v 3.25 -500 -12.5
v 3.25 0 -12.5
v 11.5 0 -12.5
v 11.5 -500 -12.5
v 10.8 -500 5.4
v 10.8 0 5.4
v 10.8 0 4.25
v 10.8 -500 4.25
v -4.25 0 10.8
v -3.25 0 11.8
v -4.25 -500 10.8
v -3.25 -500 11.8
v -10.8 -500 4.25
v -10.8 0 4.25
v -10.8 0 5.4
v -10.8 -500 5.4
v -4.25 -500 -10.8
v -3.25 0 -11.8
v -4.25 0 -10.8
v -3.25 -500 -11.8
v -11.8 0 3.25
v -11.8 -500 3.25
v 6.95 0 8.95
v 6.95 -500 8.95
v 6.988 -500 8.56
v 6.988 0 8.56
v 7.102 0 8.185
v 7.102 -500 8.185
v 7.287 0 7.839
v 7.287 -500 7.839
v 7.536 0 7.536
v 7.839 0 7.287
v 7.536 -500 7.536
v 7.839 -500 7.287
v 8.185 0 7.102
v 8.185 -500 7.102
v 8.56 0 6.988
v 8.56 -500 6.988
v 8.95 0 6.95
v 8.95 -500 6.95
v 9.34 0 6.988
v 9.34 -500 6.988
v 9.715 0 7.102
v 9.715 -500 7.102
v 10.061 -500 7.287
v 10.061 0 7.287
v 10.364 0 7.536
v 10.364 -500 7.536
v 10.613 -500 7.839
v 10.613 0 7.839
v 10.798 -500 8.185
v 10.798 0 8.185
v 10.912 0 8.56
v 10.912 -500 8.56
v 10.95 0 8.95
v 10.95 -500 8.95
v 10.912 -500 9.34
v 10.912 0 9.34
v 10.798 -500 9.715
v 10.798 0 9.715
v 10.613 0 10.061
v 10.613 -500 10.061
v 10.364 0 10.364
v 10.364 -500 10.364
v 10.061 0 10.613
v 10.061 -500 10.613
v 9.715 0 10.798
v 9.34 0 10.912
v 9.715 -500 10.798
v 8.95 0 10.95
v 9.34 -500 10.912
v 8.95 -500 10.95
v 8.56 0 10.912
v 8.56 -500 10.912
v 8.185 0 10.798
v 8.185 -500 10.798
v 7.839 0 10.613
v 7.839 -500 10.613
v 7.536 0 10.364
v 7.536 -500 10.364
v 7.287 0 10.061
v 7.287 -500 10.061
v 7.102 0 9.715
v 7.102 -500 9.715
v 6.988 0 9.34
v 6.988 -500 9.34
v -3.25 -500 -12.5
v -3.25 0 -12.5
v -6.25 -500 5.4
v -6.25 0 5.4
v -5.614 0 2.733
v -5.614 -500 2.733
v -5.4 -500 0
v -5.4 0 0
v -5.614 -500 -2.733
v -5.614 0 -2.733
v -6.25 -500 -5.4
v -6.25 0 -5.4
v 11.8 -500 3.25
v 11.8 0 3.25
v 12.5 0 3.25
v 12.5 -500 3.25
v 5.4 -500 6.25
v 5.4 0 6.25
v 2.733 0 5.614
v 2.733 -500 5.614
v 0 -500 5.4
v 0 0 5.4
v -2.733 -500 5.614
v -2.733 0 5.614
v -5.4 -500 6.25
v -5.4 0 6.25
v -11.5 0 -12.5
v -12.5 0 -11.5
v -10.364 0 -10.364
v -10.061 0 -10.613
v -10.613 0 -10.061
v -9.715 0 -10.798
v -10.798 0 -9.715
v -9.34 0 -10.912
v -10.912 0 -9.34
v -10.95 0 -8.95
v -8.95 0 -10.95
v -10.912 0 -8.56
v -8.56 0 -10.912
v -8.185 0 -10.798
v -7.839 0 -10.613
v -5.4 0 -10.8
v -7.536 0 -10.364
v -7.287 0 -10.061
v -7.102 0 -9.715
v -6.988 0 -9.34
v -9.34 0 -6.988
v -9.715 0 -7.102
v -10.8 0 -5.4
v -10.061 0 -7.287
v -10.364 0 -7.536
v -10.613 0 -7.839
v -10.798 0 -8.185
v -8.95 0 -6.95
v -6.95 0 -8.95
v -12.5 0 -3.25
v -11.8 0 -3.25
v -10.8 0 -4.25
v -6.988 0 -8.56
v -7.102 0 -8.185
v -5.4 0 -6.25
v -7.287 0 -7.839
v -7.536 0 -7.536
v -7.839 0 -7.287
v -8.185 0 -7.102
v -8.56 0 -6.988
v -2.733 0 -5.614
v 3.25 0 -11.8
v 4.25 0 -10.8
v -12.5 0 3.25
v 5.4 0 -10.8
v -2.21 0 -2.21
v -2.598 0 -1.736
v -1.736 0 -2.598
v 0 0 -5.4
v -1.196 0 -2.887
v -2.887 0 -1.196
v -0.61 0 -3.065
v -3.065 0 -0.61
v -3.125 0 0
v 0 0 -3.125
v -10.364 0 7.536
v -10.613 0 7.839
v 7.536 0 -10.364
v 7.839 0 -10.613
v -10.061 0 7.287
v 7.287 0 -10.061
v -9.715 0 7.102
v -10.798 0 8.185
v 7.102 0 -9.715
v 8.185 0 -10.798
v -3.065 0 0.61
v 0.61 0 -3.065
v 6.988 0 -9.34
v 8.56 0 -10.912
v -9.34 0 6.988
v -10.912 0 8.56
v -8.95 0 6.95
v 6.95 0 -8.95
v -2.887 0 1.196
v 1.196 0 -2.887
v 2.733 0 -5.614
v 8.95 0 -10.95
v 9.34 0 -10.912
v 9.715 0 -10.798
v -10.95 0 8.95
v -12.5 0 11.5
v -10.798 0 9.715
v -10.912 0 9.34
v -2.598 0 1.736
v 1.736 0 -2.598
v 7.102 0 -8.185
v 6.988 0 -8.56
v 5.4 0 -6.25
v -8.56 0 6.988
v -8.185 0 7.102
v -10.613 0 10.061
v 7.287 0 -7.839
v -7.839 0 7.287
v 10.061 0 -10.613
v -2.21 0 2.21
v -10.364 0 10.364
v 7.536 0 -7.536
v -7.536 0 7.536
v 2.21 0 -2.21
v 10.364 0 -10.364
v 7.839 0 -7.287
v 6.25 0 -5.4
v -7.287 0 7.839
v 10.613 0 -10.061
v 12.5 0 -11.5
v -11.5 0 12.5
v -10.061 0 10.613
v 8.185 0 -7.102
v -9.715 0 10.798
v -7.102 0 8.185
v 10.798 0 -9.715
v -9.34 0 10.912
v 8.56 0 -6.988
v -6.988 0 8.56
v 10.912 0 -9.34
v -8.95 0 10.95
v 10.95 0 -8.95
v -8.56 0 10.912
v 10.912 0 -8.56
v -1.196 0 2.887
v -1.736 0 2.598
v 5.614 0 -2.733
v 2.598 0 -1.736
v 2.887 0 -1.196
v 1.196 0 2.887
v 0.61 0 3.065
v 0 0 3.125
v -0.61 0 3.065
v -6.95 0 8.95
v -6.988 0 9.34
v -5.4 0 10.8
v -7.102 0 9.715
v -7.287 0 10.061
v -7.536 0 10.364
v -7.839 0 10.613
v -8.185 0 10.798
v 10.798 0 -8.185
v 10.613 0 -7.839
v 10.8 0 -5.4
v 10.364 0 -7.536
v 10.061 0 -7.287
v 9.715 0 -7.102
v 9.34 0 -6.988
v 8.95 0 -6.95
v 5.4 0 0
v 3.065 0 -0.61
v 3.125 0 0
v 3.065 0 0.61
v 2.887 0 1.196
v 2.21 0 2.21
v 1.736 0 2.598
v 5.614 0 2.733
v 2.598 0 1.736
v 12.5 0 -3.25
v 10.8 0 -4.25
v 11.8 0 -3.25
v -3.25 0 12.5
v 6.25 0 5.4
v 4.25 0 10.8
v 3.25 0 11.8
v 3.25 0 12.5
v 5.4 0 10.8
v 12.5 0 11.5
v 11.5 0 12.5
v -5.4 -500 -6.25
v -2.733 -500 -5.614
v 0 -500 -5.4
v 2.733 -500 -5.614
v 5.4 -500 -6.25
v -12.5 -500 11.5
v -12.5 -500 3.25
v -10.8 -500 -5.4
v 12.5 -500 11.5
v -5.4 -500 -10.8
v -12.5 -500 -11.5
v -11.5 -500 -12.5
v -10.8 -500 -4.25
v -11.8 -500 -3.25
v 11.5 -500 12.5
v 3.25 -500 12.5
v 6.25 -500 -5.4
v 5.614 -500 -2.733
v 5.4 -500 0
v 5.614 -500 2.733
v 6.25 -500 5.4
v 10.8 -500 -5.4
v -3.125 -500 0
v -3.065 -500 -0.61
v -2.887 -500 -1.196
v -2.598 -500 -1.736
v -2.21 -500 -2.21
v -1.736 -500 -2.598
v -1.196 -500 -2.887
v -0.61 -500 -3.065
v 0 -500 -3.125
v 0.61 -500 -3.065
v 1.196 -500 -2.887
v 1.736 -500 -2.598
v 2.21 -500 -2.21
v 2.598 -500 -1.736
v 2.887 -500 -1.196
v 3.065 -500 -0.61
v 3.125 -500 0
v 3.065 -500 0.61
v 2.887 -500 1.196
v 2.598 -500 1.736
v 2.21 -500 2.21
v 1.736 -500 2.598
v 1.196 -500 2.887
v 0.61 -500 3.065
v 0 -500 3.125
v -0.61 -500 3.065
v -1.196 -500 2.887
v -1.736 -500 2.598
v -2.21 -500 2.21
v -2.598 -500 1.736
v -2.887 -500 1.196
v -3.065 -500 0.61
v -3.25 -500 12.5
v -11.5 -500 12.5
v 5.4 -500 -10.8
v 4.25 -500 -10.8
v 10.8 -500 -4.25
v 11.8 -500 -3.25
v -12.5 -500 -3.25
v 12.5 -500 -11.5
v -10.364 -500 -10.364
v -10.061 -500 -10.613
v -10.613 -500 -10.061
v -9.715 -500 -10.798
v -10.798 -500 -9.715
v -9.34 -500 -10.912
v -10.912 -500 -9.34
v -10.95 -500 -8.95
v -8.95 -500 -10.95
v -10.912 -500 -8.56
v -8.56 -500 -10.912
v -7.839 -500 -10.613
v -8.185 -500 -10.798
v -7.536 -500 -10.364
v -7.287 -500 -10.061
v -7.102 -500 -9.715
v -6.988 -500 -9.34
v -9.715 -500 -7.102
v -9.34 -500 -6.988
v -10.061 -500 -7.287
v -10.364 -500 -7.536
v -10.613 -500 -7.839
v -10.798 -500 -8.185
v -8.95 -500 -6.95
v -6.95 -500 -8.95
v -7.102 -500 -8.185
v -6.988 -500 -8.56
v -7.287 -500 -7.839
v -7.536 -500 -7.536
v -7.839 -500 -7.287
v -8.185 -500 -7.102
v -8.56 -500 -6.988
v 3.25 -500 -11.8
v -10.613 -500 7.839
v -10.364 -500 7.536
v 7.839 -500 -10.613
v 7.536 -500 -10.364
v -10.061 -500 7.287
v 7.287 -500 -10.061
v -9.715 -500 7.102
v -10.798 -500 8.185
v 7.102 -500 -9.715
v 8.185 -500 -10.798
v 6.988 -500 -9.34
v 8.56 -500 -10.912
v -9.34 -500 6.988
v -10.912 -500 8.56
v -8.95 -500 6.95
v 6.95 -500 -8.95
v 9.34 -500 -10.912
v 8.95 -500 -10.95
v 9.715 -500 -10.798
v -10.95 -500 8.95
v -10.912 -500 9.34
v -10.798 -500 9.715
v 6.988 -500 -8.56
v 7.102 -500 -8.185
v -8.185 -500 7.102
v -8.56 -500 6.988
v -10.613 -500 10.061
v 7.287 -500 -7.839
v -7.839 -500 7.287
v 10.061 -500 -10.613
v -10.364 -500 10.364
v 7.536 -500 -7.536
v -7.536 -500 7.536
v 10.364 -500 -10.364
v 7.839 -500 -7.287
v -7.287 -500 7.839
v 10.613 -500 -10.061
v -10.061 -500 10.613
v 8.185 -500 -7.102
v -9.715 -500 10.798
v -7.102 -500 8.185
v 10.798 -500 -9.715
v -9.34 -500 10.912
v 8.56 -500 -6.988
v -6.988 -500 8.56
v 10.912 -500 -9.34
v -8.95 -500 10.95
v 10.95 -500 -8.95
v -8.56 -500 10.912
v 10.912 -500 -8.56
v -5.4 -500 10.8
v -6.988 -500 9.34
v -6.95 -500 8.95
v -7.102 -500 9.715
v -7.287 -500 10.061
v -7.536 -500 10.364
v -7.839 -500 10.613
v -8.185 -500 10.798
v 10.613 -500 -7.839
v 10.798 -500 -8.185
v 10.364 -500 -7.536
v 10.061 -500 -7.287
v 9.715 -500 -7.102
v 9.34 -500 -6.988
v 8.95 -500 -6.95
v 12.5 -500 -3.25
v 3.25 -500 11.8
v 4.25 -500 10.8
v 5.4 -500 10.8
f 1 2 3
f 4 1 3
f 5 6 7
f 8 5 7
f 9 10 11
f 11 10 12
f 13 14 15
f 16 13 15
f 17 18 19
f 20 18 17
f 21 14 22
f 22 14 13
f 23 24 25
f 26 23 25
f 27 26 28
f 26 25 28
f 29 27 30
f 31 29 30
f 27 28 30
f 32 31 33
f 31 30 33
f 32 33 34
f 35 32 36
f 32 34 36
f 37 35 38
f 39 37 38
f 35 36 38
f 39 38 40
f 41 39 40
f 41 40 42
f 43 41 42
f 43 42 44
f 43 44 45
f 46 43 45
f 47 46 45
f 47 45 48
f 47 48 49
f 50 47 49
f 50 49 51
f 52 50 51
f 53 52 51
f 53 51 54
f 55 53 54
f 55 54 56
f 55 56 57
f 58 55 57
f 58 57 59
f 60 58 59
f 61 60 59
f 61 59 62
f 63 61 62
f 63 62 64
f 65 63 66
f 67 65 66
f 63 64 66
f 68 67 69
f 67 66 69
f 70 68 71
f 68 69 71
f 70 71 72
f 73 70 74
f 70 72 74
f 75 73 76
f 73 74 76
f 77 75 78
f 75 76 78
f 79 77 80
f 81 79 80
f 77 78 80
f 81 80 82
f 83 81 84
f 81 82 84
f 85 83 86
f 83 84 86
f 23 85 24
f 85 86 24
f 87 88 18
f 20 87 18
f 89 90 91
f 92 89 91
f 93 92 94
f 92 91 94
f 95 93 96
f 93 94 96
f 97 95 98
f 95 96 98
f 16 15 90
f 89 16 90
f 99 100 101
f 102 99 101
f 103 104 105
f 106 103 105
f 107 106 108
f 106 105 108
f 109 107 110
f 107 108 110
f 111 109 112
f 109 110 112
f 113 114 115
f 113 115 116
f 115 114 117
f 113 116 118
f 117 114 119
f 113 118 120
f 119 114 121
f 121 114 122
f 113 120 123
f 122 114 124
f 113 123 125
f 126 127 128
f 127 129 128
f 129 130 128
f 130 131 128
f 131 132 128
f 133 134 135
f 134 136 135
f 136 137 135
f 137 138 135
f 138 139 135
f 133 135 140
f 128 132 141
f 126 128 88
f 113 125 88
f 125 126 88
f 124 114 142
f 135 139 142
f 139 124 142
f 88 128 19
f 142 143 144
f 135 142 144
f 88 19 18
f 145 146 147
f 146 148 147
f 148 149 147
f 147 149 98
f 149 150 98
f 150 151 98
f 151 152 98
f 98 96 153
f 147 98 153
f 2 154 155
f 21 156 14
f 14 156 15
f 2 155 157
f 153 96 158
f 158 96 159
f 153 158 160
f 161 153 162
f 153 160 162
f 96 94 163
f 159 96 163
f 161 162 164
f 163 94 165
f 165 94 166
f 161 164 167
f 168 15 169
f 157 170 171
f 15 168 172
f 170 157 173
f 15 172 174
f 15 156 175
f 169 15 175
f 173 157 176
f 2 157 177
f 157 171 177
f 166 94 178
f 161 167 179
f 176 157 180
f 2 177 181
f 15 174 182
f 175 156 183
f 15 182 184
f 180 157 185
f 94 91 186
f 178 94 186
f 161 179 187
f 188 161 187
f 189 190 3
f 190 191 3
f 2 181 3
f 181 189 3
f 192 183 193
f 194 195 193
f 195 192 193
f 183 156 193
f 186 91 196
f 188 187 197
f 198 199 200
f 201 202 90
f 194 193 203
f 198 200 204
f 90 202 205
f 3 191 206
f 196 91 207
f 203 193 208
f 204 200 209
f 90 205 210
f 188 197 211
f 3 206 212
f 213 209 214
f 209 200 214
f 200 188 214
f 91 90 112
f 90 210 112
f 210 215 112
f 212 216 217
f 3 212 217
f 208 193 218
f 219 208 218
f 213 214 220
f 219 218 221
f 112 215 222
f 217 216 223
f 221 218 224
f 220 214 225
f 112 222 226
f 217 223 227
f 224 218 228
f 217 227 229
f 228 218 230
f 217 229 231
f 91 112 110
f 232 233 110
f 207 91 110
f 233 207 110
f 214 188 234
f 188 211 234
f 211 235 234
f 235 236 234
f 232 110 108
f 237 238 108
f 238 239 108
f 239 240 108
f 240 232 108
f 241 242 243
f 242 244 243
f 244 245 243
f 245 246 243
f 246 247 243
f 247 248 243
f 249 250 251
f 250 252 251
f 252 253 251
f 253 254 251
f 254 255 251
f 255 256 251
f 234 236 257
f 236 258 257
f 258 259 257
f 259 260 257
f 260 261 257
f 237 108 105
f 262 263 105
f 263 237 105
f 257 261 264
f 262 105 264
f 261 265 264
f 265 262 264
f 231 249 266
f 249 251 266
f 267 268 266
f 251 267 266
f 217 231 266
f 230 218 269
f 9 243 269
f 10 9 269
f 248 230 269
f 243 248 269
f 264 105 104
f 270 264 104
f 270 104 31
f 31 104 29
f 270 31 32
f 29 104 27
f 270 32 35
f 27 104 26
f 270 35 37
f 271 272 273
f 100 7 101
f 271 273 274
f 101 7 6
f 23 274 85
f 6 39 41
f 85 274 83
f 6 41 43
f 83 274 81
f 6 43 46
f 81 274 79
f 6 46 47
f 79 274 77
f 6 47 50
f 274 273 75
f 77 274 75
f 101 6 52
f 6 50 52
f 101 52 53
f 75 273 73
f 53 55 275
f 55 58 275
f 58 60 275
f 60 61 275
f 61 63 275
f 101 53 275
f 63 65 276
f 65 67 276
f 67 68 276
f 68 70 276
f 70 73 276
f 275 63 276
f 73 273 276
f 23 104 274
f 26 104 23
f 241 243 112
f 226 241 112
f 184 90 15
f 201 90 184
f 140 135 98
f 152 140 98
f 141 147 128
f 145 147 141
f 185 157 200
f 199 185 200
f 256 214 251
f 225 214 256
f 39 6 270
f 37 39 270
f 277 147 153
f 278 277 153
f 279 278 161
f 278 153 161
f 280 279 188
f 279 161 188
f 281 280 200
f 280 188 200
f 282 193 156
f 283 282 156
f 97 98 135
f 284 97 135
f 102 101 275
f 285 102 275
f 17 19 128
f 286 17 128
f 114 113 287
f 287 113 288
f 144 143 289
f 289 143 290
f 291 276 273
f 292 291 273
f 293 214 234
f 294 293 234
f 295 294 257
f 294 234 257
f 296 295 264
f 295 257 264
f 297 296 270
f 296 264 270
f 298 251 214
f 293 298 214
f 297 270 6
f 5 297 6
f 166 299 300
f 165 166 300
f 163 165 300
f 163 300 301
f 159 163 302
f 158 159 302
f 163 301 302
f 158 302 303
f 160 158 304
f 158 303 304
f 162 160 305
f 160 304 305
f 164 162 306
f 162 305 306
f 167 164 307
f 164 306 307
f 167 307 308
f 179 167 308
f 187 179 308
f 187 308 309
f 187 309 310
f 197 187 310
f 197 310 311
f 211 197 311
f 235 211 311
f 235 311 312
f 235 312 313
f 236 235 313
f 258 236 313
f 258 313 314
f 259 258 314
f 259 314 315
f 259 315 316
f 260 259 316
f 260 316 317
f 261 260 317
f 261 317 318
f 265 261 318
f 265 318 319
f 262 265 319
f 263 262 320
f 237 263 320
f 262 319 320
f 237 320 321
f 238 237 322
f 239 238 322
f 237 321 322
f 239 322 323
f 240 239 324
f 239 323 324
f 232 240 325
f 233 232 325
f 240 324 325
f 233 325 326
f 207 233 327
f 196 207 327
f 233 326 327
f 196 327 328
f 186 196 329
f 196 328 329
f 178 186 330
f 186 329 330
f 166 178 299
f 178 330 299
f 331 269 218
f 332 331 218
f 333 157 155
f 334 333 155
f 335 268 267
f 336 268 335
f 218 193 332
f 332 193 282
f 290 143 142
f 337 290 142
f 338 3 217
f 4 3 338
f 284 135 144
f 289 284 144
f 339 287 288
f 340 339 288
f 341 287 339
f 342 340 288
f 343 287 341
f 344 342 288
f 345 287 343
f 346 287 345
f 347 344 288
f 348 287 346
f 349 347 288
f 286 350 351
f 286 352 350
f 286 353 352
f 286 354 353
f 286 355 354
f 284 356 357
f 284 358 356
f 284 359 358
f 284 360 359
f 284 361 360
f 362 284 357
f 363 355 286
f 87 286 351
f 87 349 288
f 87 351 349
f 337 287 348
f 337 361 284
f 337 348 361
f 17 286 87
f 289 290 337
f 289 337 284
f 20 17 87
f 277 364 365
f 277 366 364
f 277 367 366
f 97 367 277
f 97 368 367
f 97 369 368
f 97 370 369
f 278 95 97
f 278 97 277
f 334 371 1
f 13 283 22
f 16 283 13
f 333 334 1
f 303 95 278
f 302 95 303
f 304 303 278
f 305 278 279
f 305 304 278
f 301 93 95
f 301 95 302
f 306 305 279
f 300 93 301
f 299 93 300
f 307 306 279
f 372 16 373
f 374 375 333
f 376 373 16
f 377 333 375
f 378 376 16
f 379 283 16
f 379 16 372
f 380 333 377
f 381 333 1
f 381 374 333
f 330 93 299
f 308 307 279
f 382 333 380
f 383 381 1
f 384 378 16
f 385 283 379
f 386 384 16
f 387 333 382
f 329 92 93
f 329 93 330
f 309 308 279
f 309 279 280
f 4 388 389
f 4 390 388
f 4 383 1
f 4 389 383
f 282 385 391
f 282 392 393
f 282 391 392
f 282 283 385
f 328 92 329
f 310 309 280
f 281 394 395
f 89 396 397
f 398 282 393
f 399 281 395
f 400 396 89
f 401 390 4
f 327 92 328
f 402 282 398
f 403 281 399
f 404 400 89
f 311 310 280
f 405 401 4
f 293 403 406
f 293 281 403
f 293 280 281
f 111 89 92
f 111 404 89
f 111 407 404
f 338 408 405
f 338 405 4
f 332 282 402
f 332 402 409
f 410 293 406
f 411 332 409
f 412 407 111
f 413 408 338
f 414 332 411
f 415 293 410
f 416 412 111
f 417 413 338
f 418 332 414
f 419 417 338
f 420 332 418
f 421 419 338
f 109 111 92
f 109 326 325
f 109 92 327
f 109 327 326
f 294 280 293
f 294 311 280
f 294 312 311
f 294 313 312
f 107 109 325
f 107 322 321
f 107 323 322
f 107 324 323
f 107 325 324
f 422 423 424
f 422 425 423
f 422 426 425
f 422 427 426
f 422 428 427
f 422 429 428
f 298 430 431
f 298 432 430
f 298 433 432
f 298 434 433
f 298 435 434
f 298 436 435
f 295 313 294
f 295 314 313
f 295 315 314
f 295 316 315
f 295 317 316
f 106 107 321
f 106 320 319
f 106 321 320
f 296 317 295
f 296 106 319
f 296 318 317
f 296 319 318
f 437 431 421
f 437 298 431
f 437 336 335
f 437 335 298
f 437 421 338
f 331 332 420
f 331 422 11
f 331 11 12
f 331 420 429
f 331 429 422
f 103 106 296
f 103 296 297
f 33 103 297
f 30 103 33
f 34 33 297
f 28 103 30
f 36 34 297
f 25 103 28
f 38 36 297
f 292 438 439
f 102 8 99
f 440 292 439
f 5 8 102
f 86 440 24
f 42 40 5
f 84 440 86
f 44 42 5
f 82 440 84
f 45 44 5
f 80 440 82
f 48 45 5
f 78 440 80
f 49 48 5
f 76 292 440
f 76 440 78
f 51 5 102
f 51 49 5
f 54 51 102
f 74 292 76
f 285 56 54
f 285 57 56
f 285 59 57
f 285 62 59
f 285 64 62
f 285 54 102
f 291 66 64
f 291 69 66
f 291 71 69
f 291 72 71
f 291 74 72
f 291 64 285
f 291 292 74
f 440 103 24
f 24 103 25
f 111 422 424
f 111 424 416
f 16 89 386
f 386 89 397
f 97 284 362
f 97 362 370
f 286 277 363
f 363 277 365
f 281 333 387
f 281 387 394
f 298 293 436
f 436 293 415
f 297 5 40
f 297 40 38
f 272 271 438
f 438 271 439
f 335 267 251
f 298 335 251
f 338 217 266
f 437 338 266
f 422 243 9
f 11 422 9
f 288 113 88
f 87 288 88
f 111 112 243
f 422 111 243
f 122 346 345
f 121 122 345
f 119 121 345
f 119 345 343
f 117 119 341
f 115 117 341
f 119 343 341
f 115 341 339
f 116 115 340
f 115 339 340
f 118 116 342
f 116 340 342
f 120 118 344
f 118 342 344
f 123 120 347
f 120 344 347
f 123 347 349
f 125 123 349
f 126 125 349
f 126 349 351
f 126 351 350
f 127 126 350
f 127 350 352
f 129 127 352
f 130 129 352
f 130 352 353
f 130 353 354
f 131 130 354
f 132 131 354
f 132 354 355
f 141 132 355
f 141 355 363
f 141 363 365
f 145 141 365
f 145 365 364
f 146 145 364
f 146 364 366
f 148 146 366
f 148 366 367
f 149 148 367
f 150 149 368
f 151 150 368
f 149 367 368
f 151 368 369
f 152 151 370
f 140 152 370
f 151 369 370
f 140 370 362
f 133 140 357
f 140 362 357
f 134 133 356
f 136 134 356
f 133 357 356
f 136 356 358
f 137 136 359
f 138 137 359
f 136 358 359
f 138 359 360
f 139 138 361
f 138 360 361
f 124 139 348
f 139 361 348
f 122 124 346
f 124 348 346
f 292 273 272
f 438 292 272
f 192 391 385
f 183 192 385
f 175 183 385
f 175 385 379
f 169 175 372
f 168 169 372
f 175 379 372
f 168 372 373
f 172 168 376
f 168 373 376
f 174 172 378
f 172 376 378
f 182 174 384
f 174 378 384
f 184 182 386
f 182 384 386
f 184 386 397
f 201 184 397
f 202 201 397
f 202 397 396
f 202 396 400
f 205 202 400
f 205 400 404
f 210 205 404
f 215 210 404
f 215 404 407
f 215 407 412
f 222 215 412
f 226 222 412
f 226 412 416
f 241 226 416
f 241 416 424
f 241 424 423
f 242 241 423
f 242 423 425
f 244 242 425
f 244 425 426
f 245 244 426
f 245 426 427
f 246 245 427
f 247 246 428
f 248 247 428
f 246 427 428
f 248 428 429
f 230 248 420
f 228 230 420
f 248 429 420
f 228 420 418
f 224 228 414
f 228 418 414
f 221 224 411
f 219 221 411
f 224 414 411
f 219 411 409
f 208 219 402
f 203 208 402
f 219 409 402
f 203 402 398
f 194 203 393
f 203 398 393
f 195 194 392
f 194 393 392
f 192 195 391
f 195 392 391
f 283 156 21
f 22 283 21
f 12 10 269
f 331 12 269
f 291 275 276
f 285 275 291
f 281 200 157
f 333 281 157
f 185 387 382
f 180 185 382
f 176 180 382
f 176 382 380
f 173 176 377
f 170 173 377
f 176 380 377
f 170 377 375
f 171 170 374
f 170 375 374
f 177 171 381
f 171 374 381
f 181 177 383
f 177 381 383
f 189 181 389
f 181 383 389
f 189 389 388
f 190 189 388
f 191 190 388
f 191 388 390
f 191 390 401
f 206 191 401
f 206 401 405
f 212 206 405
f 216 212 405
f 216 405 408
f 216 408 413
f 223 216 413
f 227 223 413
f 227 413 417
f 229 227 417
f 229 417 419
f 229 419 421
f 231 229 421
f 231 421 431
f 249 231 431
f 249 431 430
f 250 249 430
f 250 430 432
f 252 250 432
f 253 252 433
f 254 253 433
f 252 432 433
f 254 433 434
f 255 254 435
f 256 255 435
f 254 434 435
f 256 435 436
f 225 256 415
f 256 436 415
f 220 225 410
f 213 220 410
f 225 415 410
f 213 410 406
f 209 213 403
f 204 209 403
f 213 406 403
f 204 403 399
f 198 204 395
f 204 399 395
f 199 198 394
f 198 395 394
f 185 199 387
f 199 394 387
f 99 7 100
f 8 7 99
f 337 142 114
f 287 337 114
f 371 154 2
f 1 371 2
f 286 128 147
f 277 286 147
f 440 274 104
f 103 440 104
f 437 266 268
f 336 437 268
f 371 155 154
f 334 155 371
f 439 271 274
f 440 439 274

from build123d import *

# Parameters (mm, degrees)
F1_DEPTH = 500
F2_SIZE  = 1
F3_SIZE  = 1
F4_SIZE  = 1
F5_D     = 4
F6_D     = 4
F7_D     = 4
F8_D     = 4
F9_D     = 6.25


with BuildPart() as f1:
    # F0 (on Front) → F1 (new body)
    with BuildSketch(Plane.XZ):
        with BuildLine():
            Line((12.5, -12.5), (12.5, -3.25))
            Line((12.5, -3.25), (10.8, -3.25))
            Line((10.8, -3.25), (10.8, -5.4))
            Line((10.8, -5.4), (6.25, -5.4))
            ThreePointArc((6.25, -5.4), (5.4, 0), (6.25, 5.4))
            Line((6.25, 5.4), (10.8, 5.4))
            Line((10.8, 5.4), (10.8, 3.25))
            Line((10.8, 3.25), (12.5, 3.25))
            Line((12.5, 3.25), (12.5, 12.5))
            Line((12.5, 12.5), (3.25, 12.5))
            Line((3.25, 12.5), (3.25, 10.8))
            Line((3.25, 10.8), (5.4, 10.8))
            Line((5.4, 10.8), (5.4, 6.25))
            ThreePointArc((5.4, 6.25), (0, 5.4), (-5.4, 6.25))
            Line((-5.4, 6.25), (-5.4, 10.8))
            Line((-5.4, 10.8), (-3.25, 10.8))
            Line((-3.25, 10.8), (-3.25, 12.5))
            Line((-3.25, 12.5), (-12.5, 12.5))
            Line((-12.5, 12.5), (-12.5, 3.25))
            Line((-12.5, 3.25), (-10.8, 3.25))
            Line((-10.8, 3.25), (-10.8, 5.4))
            Line((-10.8, 5.4), (-6.25, 5.4))
            ThreePointArc((-6.25, 5.4), (-5.4, 0), (-6.25, -5.4))
            Line((-6.25, -5.4), (-10.8, -5.4))
            Line((-10.8, -5.4), (-10.8, -3.25))
            Line((-10.8, -3.25), (-12.5, -3.25))
            Line((-12.5, -3.25), (-12.5, -12.5))
            Line((-12.5, -12.5), (-3.25, -12.5))
            Line((-3.25, -12.5), (-3.25, -10.8))
            Line((-3.25, -10.8), (-5.4, -10.8))
            Line((-5.4, -10.8), (-5.4, -6.25))
            ThreePointArc((-5.4, -6.25), (0, -5.4), (5.4, -6.25))
            Line((5.4, -6.25), (5.4, -10.8))
            Line((5.4, -10.8), (3.25, -10.8))
            Line((3.25, -10.8), (3.25, -12.5))
            Line((3.25, -12.5), (12.5, -12.5))
        make_face()
    extrude(amount=F1_DEPTH)

    # F2
    f2_edges = [f1.edges().sort_by_distance(p)[0] for p in [
        (-12.5, -250, 12.5),
    ]]
    chamfer(f2_edges, length=F2_SIZE)

    # F3
    f3_edges = [f1.edges().sort_by_distance(p)[0] for p in [
        (12.5, -250, 12.5),
        (12.5, -250, -12.5),
        (-12.5, -250, -12.5),
    ]]
    chamfer(f3_edges, length=F3_SIZE)

    # F4
    f4_edges = [f1.edges().sort_by_distance(p)[0] for p in [
        (3.25, -250, 10.8),
        (10.8, -250, 3.25),
        (10.8, -250, -3.25),
        (3.25, -250, -10.8),
        (-3.25, -250, -10.8),
        (-10.8, -250, -3.25),
        (-3.25, -250, 10.8),
        (-10.8, -250, 3.25),
    ]]
    chamfer(f4_edges, length=F4_SIZE)

    # F5 (through all)
    with Locations(Plane(origin=(0, 0, 0), x_dir=(1, 0, 0), z_dir=(0, 1, 0))):
        with Locations((8.95, -8.95)):
            Hole(F5_D / 2)

    # F6 (through all)
    with Locations(Plane(origin=(0, 0, 0), x_dir=(1, 0, 0), z_dir=(0, 1, 0))):
        with Locations((8.95, 8.95)):
            Hole(F6_D / 2)

    # F7 (through all)
    with Locations(Plane(origin=(0, 0, 0), x_dir=(1, 0, 0), z_dir=(0, 1, 0))):
        with Locations((-8.95, -8.95)):
            Hole(F7_D / 2)

    # F8 (through all)
    with Locations(Plane(origin=(0, 0, 0), x_dir=(1, 0, 0), z_dir=(0, 1, 0))):
        with Locations((-8.95, 8.95)):
            Hole(F8_D / 2)

    # F9 (through all)
    with Locations(Plane(origin=(0, 0, 0), x_dir=(1, 0, 0), z_dir=(0, 1, 0))):
        with Locations((0, 0)):
            Hole(F9_D / 2)


solid = f1.part
